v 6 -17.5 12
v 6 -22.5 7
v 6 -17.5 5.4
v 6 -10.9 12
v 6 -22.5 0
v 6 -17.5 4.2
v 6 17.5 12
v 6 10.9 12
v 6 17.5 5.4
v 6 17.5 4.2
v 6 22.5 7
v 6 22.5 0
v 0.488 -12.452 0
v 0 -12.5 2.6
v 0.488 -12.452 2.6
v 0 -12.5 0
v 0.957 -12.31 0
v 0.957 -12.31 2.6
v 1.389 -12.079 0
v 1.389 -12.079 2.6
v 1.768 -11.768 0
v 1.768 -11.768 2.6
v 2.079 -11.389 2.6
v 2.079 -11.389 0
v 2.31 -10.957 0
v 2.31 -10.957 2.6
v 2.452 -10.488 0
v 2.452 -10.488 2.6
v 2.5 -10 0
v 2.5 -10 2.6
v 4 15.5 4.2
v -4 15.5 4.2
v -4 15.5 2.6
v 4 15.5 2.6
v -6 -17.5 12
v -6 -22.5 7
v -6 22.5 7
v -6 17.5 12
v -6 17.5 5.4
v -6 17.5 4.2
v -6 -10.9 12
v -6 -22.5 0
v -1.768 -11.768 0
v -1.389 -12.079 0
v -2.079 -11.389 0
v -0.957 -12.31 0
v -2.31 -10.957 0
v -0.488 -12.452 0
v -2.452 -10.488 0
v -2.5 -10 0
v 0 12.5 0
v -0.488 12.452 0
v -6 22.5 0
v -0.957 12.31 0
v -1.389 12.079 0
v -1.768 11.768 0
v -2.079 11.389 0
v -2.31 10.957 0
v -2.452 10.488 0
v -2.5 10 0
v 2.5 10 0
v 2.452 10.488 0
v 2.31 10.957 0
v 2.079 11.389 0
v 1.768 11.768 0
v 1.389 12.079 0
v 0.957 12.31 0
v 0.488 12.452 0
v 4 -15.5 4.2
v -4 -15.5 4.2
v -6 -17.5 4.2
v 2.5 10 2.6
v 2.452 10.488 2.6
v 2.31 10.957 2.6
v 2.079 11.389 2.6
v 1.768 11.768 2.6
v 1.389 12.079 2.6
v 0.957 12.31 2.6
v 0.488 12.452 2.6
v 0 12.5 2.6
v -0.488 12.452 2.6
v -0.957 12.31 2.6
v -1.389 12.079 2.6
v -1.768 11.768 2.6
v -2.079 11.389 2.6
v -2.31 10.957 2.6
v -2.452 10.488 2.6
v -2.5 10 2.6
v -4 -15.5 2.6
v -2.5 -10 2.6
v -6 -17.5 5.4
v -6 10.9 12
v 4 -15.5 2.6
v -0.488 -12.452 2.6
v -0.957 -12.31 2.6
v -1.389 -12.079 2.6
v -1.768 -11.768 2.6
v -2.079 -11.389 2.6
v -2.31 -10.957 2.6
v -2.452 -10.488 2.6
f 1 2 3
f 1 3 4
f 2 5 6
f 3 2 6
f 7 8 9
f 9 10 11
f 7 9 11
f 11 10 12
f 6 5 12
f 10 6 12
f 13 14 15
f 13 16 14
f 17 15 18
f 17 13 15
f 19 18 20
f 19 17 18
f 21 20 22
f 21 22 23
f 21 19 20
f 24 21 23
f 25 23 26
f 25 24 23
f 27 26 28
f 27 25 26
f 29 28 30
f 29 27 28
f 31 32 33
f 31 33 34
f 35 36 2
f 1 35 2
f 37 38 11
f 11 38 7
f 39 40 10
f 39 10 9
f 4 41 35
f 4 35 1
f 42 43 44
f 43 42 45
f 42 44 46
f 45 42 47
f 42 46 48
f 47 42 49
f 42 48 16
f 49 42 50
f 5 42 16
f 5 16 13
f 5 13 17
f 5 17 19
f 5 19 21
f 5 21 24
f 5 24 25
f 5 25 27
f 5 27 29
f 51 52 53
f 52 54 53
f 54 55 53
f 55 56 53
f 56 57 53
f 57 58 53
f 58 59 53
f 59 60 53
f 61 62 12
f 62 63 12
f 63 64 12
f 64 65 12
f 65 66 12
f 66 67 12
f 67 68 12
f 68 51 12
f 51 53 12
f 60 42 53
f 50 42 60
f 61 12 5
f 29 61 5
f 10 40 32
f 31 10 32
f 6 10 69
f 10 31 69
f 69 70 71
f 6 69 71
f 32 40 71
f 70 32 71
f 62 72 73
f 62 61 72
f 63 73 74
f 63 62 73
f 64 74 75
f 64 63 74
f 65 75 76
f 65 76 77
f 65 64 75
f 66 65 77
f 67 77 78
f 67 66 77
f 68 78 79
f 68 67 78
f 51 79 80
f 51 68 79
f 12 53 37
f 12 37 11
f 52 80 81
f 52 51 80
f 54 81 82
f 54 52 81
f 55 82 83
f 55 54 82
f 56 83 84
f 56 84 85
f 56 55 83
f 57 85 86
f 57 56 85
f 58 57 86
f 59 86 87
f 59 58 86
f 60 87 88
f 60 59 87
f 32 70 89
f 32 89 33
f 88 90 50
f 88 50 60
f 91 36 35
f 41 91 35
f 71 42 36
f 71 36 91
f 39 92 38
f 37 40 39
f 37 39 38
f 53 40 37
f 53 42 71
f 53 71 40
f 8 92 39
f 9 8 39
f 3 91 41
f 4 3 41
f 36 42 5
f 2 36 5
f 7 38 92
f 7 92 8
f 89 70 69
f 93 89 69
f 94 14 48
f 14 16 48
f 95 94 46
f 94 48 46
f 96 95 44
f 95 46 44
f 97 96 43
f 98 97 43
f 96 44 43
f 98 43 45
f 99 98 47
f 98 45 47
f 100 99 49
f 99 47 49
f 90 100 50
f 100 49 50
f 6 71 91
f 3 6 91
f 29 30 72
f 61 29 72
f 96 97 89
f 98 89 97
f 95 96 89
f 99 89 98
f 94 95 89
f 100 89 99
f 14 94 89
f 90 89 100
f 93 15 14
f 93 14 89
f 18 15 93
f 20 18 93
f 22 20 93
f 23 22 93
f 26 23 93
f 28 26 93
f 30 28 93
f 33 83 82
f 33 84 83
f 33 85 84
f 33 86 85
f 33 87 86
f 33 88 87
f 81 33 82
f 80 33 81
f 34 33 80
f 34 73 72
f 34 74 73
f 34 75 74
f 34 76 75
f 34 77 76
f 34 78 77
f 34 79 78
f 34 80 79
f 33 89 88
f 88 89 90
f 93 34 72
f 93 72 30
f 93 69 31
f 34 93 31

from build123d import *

# Parameters (mm, degrees)
F0_W     = 12
F0_H     = 45
F1_DEPTH = 12
F2_W     = 35
F2_H     = 1.2
F3_DEPTH = 12
F4_SIZE  = 5
F5_W     = 8
F5_H     = 31
F6_DEPTH = 1.6
F7_W     = 5
F7_H     = 25
F8_DEPTH = 2.6
F9_R     = 2.49999


# Not quite as in the source:
# - a fillet or chamfer is up to 0.001 mm smaller than in the source, because OpenCascade refuses the exact size


with BuildPart() as f1:
    # F0 (on Top) → F1 (new body)
    with BuildSketch(Plane.XY):
        Rectangle(F0_W, F0_H)
    extrude(amount=F1_DEPTH)

    # F2 (on face) → F3 (cut, through all)
    with BuildSketch(Plane(origin=(-6, 0, 0), x_dir=(0, -1, 0), z_dir=(-1, 0, 0))):
        Polygon((-17.5, 5.4), (17.5, 5.4), (10.9, 12), (-10.9, 12), align=None)
        with Locations((0, 4.8)):
            Rectangle(F2_W, F2_H)
    extrude(amount=-F3_DEPTH, mode=Mode.SUBTRACT)

    # F4
    f4_edges = [f1.edges().sort_by_distance(p)[0] for p in [
        (0, 22.5, 12),
        (0, -22.5, 12),
    ]]
    chamfer(f4_edges, length=F4_SIZE)

    # F5 (on face) → F6 (cut)
    with BuildSketch(Plane.XY.offset(4.2)):
        Rectangle(F5_W, F5_H)
    extrude(amount=-F6_DEPTH, mode=Mode.SUBTRACT)

    # F7 (on face) → F8 (cut, through all)
    with BuildSketch(Plane.XY.offset(2.6)):
        Rectangle(F7_W, F7_H)
    extrude(amount=-F8_DEPTH, mode=Mode.SUBTRACT)

    # F9 (radius 2.5 in the source; OpenCascade refuses exactly that, so slightly less here)
    f9_edges = [f1.edges().sort_by_distance(p)[0] for p in [
        (2.5, 12.5, 1.3),
        (-2.5, 12.5, 1.3),
        (-2.5, -12.5, 1.3),
        (2.5, -12.5, 1.3),
    ]]
    fillet(f9_edges, radius=F9_R)


solid = f1.part
